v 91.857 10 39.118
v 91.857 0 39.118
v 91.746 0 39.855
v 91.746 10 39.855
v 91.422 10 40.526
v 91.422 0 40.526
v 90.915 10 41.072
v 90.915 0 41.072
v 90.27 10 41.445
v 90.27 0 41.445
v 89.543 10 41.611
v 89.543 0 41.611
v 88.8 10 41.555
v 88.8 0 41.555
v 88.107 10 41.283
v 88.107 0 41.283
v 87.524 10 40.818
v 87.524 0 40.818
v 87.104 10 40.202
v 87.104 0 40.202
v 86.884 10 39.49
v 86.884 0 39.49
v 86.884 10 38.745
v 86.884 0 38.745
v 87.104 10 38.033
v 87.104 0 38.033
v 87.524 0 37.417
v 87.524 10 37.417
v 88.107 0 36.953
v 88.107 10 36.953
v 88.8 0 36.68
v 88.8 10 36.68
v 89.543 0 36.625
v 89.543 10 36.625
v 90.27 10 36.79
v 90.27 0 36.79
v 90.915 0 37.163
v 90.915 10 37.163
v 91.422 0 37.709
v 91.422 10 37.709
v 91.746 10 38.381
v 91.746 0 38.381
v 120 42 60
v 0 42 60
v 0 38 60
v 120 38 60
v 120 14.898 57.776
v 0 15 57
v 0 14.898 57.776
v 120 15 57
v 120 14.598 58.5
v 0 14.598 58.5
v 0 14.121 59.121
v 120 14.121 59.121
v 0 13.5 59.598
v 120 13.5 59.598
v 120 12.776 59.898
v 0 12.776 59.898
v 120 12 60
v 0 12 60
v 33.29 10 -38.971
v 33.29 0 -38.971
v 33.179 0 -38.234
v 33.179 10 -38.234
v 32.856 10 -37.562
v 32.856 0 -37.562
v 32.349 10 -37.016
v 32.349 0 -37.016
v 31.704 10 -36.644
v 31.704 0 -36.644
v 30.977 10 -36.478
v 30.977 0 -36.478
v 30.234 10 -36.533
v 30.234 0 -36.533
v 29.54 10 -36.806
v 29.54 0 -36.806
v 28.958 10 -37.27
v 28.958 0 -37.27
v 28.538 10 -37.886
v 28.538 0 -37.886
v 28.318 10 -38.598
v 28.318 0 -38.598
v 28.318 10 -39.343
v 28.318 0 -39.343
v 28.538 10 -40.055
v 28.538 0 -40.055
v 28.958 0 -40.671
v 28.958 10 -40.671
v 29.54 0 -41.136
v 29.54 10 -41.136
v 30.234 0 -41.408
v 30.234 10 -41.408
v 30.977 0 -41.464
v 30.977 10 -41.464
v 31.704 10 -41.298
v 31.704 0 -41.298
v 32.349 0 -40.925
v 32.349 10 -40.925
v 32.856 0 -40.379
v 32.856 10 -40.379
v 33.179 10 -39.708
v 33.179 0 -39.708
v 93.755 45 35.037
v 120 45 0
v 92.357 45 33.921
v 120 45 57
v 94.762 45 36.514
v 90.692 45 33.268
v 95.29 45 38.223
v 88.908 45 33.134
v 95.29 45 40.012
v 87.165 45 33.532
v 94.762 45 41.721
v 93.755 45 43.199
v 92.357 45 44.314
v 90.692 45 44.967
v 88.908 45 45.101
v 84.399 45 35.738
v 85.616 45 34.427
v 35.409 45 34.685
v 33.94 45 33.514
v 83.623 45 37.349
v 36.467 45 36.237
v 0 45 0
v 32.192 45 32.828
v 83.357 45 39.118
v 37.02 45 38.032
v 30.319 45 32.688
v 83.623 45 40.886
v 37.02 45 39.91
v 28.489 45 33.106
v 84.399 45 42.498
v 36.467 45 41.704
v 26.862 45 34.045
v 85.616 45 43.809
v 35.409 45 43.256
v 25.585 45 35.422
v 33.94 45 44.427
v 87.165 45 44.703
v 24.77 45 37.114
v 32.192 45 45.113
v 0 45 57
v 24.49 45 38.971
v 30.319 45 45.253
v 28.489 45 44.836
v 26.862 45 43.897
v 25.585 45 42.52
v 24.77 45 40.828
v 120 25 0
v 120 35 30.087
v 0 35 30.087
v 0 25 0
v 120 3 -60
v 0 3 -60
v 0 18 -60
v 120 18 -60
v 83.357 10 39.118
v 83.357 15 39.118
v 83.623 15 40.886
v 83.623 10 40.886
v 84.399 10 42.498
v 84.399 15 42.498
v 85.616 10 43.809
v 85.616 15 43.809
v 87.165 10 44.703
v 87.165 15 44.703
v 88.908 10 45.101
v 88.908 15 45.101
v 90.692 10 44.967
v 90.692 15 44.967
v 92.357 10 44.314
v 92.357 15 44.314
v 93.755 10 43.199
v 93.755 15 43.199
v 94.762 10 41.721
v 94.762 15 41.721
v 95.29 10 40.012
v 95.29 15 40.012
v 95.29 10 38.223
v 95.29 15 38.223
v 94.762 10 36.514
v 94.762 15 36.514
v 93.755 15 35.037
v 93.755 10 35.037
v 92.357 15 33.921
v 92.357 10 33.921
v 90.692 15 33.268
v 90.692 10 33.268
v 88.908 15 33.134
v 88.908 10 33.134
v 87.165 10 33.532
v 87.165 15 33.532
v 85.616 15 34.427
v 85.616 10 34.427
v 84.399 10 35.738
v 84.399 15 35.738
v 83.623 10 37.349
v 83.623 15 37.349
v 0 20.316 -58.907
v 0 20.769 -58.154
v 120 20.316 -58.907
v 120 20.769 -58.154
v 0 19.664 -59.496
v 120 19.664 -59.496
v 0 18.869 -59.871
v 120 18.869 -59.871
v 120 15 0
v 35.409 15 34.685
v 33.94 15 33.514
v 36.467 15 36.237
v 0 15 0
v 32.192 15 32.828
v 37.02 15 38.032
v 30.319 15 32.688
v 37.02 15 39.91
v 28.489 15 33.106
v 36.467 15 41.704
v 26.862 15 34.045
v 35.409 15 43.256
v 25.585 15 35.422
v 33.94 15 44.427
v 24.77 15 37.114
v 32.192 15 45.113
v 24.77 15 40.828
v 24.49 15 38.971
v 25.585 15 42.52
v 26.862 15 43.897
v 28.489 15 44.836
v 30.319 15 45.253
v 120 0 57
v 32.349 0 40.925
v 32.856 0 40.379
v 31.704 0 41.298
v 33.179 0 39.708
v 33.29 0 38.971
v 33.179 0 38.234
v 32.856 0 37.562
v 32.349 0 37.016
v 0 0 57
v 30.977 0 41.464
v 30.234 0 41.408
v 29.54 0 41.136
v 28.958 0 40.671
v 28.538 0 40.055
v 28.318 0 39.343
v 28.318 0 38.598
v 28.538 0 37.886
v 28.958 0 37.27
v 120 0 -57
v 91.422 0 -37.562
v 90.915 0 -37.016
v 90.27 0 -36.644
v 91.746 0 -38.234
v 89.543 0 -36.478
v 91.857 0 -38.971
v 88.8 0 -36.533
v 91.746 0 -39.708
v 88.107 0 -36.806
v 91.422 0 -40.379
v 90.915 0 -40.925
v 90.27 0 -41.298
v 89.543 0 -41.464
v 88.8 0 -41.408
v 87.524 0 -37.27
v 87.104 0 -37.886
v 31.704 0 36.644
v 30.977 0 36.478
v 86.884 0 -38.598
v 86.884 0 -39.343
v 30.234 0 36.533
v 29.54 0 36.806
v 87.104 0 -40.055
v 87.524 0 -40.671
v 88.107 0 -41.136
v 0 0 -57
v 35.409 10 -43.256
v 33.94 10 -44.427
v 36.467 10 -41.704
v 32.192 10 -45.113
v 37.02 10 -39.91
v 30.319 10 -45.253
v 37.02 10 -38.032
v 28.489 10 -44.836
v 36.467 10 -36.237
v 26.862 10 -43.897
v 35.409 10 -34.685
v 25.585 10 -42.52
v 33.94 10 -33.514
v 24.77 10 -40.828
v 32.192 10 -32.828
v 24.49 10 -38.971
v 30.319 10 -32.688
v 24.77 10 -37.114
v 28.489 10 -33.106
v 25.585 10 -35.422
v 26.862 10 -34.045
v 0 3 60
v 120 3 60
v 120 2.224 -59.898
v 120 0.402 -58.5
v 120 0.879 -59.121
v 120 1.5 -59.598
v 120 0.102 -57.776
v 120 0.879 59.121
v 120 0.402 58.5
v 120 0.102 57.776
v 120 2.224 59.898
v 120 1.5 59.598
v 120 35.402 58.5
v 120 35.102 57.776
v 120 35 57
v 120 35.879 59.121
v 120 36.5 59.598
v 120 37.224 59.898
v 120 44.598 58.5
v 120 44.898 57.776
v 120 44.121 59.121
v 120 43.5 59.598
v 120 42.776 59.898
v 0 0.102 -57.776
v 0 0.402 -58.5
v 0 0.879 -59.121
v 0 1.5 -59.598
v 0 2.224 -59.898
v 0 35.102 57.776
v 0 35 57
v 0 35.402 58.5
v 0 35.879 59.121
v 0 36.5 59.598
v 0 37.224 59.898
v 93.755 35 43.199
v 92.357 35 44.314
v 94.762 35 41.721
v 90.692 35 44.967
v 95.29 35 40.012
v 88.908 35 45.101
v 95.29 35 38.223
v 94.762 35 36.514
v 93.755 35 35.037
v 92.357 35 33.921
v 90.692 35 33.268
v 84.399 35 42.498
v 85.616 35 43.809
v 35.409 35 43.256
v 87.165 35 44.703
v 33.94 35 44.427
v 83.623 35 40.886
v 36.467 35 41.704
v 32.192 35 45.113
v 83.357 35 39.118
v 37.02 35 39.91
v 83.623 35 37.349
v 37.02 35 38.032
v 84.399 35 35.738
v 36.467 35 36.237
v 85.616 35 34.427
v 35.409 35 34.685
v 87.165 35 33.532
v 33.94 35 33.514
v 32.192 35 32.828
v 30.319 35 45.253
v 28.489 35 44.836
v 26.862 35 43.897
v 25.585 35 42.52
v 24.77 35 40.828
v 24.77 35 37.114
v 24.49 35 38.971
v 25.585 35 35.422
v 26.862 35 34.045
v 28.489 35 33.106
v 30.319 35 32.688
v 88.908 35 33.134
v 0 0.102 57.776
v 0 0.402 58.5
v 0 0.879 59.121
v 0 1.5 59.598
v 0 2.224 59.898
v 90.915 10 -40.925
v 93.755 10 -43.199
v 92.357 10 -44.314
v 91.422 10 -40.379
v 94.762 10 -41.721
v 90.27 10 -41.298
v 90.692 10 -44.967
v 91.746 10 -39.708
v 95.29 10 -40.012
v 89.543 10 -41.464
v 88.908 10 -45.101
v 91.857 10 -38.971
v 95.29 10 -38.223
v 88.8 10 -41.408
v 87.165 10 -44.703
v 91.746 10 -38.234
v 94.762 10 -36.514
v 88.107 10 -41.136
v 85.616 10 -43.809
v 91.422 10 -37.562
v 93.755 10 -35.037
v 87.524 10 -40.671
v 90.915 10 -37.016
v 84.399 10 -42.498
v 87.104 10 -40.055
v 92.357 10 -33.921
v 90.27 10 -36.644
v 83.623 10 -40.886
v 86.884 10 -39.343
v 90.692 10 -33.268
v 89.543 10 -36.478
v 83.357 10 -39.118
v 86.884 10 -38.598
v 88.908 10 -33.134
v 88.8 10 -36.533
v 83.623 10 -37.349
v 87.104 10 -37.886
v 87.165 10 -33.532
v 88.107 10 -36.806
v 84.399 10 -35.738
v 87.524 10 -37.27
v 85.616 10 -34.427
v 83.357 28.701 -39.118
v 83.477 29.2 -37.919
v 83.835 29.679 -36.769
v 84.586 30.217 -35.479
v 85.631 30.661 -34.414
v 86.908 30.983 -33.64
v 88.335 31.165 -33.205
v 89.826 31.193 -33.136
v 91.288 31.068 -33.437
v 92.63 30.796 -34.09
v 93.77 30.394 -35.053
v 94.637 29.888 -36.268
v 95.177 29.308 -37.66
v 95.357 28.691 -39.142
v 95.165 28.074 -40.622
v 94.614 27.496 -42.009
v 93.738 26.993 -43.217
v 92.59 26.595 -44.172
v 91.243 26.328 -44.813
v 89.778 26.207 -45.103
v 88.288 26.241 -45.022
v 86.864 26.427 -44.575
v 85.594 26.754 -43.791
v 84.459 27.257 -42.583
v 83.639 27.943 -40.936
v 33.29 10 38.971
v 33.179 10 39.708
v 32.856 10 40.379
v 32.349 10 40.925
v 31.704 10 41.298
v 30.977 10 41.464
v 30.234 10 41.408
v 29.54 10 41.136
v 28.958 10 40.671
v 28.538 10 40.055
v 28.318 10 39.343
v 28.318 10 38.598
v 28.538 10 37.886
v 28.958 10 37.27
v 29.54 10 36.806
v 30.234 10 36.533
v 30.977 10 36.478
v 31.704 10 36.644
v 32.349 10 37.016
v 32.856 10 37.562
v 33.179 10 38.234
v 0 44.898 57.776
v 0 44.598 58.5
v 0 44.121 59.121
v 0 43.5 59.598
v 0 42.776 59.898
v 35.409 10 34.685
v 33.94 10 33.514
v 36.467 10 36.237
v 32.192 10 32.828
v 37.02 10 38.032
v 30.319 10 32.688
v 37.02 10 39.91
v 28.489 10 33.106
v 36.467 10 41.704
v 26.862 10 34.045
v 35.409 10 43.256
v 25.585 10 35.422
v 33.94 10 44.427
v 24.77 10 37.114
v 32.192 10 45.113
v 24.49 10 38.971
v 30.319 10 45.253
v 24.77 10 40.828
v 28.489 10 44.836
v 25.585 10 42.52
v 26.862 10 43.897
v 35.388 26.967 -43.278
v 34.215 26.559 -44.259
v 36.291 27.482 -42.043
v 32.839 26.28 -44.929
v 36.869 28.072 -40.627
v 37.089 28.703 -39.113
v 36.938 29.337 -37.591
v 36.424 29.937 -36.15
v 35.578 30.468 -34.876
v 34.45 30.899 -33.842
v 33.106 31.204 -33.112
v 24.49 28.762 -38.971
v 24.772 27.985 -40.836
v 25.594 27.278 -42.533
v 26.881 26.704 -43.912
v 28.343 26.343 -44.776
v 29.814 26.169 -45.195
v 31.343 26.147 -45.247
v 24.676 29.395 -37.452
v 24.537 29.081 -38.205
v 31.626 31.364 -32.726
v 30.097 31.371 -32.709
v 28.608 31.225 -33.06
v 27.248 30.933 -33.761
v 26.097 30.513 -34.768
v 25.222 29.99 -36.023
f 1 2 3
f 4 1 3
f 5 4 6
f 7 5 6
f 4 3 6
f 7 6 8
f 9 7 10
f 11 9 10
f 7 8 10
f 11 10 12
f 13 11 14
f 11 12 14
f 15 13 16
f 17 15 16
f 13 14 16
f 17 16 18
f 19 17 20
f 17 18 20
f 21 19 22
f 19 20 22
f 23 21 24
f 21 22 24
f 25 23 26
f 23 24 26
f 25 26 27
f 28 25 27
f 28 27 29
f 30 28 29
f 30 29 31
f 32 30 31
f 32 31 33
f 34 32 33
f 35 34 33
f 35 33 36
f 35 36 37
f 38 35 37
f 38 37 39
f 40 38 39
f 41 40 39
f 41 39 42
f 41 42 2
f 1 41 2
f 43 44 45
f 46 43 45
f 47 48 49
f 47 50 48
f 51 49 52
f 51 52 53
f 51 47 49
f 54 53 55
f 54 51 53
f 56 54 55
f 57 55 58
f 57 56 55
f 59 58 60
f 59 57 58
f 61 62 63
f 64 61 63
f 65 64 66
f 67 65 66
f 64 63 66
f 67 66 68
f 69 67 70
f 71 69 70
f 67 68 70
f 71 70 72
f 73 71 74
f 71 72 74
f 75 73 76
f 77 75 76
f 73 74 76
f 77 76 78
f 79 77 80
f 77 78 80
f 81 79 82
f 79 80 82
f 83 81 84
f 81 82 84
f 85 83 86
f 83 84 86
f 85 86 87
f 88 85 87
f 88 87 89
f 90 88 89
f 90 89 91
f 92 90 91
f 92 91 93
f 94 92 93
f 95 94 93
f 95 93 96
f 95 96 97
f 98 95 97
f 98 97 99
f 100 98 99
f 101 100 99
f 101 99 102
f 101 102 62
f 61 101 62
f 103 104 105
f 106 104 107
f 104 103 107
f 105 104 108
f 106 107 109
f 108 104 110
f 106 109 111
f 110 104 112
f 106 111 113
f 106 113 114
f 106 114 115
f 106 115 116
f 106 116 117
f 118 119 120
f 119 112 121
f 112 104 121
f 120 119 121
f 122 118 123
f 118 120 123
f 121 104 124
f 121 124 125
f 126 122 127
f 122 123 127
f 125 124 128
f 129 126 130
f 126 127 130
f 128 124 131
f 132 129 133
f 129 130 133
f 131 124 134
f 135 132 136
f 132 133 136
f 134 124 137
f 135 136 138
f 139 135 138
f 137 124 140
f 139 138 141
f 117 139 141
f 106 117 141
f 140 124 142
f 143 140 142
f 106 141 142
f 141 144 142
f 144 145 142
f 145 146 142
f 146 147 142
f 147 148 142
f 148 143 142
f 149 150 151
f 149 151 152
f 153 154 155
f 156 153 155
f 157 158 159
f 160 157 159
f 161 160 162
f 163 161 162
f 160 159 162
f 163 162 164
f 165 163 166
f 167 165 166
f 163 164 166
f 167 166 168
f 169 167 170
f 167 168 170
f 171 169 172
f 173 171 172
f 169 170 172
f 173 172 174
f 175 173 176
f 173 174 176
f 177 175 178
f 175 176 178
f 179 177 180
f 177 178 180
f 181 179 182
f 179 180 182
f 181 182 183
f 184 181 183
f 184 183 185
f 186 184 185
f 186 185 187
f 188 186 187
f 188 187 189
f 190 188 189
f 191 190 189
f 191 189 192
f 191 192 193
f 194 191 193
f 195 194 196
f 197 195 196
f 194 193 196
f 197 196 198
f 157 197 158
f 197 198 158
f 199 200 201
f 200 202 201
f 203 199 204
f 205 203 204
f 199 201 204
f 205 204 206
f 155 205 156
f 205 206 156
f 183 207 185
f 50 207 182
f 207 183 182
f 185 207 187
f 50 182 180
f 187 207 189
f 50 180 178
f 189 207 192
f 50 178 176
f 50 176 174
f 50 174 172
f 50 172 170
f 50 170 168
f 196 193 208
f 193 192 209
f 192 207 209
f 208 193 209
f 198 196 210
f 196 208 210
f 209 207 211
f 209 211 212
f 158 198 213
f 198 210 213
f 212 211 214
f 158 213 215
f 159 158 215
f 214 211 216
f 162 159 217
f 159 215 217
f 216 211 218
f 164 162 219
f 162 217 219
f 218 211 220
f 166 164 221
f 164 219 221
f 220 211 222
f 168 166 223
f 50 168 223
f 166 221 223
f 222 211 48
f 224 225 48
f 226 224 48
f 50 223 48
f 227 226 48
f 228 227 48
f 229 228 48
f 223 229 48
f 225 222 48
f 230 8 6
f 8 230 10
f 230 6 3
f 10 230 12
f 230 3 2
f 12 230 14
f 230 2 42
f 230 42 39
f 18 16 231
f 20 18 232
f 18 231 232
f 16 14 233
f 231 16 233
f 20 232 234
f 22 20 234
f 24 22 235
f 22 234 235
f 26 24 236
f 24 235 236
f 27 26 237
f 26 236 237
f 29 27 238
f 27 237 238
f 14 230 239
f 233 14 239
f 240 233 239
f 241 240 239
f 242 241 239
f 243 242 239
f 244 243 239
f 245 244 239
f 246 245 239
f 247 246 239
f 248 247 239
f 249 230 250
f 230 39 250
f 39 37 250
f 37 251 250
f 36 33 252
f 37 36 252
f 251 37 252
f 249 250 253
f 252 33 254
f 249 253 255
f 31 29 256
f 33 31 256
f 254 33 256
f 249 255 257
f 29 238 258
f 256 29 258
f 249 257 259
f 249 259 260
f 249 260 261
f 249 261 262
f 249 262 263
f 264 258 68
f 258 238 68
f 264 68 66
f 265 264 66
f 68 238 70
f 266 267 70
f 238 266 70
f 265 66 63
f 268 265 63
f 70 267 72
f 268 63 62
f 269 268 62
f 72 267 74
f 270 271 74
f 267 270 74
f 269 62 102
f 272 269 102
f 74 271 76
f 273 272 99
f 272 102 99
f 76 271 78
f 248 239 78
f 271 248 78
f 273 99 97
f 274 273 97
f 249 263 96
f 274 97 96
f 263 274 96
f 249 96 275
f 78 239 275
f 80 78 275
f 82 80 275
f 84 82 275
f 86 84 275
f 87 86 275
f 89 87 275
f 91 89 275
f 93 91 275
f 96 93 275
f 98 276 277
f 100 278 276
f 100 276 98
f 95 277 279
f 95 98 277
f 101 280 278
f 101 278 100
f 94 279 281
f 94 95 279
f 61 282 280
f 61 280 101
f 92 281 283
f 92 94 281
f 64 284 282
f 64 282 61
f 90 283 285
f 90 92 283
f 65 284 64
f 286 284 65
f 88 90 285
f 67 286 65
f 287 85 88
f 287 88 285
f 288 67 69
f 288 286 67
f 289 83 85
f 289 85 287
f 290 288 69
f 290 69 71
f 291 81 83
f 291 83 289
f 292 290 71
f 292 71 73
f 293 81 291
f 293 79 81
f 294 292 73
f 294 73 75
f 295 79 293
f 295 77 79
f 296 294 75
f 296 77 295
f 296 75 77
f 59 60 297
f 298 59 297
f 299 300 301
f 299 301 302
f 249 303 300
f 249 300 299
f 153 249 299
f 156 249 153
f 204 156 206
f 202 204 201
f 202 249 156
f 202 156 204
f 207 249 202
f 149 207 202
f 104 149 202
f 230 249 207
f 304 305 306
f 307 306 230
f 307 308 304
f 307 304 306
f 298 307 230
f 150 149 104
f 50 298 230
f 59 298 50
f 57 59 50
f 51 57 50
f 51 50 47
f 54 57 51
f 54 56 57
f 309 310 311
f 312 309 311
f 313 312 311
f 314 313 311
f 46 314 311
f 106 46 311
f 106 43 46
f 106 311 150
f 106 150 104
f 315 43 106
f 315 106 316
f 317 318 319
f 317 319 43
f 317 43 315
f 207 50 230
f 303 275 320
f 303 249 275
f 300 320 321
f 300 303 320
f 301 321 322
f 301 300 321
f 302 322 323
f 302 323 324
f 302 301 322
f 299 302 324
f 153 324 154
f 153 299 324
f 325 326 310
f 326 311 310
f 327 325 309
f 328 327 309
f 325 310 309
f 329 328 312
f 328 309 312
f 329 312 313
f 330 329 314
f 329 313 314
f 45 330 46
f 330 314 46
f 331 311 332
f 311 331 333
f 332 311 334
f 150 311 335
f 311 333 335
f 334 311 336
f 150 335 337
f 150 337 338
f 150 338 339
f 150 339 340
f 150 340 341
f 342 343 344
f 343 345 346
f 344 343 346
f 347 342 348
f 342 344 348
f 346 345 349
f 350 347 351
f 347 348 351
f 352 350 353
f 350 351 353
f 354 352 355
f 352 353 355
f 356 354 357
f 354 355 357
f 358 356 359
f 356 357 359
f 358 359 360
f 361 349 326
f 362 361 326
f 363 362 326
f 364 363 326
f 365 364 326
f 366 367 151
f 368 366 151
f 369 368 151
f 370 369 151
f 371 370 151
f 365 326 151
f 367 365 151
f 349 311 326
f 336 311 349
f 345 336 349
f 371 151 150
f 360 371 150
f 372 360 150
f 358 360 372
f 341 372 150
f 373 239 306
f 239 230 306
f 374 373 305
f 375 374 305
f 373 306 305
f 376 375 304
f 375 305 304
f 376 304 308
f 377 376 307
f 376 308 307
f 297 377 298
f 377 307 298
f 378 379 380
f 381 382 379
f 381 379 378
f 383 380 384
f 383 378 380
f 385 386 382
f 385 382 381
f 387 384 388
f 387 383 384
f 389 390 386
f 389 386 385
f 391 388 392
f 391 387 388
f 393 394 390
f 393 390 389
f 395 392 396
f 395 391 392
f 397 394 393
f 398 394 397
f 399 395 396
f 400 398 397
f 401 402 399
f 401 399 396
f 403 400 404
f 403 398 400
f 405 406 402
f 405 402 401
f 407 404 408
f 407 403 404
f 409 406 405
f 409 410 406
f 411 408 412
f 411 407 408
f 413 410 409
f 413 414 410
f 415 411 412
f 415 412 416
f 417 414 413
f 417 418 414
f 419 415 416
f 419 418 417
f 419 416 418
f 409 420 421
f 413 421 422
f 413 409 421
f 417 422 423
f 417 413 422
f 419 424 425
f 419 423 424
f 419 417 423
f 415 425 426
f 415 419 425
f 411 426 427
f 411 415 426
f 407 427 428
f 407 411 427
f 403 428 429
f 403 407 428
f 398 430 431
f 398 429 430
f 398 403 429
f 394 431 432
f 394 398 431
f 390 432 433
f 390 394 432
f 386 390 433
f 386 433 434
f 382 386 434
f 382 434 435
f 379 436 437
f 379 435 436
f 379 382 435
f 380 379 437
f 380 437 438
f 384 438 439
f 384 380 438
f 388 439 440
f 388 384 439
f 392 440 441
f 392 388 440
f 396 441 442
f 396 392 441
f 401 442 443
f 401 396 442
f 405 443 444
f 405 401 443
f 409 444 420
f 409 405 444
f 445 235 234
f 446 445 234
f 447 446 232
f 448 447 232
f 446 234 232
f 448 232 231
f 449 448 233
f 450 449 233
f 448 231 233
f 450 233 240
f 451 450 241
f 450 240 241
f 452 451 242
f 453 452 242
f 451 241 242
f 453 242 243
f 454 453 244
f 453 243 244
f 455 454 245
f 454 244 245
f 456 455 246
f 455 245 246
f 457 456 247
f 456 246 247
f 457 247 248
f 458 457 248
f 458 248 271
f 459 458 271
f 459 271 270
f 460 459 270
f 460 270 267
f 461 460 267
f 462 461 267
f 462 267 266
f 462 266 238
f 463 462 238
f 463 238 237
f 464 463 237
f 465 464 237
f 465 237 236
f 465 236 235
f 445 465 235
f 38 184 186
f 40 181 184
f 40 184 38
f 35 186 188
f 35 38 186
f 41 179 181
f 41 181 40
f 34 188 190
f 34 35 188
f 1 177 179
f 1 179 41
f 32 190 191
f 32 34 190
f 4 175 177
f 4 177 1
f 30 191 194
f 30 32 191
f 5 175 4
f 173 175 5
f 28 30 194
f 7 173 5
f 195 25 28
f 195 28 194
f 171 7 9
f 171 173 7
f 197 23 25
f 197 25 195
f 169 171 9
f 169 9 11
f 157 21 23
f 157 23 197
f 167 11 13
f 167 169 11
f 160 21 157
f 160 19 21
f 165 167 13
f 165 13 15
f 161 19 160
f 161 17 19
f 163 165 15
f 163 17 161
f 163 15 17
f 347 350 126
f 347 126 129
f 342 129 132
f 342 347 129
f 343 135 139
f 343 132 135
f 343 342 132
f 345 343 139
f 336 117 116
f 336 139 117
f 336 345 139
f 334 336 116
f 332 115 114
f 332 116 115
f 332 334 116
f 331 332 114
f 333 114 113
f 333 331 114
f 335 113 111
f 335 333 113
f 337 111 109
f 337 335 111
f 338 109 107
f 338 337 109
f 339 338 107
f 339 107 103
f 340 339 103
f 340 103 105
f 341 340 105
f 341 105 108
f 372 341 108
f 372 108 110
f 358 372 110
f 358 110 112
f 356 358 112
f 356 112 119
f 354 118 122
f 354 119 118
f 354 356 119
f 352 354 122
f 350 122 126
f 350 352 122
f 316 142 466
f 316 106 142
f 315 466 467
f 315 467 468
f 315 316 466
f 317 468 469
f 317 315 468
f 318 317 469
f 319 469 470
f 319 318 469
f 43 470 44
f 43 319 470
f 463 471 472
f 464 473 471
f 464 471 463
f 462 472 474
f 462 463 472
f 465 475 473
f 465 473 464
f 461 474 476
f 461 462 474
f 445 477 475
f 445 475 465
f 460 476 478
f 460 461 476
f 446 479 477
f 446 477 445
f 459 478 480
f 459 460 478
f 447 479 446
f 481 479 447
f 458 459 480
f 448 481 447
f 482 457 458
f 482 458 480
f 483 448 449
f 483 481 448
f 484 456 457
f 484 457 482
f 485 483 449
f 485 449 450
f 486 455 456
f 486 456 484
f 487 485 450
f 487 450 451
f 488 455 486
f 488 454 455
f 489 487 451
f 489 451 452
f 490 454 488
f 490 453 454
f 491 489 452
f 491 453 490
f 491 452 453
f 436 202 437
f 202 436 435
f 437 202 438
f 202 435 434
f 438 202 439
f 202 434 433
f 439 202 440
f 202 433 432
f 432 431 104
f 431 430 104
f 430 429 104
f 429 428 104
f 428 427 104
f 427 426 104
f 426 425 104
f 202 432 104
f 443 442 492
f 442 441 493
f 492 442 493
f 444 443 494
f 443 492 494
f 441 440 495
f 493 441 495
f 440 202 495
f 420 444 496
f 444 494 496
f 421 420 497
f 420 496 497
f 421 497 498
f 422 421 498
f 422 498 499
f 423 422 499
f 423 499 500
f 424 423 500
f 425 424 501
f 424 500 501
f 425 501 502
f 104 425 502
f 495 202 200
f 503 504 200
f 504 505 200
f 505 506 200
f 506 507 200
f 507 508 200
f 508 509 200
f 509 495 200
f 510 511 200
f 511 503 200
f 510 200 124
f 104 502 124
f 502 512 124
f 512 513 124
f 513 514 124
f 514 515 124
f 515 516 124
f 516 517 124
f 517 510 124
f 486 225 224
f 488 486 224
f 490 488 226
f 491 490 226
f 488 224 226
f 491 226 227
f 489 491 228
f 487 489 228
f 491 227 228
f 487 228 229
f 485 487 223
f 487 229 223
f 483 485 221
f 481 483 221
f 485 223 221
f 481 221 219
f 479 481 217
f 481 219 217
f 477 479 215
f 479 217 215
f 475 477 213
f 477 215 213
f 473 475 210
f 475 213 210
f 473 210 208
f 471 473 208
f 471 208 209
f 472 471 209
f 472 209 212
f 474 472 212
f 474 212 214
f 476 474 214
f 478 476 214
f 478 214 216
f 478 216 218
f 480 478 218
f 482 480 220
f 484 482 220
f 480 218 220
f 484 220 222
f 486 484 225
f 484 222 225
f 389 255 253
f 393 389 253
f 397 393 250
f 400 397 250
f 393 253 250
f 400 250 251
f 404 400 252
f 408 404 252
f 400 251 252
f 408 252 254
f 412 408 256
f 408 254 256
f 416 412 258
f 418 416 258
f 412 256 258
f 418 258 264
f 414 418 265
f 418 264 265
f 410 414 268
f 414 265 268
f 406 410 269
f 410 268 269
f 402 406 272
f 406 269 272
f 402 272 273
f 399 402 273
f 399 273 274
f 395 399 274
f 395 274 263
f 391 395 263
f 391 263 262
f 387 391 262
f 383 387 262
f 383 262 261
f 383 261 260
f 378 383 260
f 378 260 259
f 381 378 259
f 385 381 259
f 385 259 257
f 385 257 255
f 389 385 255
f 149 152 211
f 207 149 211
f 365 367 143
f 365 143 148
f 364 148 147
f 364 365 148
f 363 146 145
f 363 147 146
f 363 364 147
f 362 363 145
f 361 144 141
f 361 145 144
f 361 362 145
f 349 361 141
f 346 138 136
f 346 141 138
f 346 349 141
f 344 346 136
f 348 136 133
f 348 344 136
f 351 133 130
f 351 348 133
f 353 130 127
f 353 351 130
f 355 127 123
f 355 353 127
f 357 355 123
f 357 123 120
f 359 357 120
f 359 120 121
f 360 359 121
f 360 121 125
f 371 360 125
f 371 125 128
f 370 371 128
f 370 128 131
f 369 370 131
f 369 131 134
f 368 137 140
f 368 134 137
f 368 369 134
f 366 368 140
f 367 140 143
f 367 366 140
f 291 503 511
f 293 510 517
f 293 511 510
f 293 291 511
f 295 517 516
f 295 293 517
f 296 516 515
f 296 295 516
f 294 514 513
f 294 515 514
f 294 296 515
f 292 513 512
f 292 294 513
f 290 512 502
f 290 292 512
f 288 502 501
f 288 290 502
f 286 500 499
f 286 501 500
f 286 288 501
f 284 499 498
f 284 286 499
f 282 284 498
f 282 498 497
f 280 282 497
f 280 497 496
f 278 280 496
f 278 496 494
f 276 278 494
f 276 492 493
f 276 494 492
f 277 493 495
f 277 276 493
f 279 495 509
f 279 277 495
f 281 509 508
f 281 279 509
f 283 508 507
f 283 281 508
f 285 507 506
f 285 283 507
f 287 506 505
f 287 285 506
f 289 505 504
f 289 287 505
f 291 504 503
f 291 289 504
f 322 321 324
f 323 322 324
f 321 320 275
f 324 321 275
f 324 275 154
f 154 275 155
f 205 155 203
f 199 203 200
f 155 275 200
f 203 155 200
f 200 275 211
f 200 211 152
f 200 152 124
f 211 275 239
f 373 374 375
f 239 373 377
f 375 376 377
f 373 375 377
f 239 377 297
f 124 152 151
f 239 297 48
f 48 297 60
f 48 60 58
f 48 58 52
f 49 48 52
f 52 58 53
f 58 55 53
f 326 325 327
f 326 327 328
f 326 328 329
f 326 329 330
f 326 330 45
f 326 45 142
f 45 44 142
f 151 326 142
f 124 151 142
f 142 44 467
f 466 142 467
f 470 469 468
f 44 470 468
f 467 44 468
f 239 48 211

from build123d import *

# Parameters (mm, degrees)
F1_DEPTH = 120
F2_R     = 2.5
F3_DEPTH = 45.001
F4_R     = 6
F4_R_2   = 6.300335
F5_DEPTH = 50.546
F6_DEPTH = 5
F7_R     = 3


with BuildPart() as f1:
    # F0 (on Right) → F1 (new body)
    with BuildSketch(Plane.YZ):
        Polygon((0, 60), (0, 0), (0, -60), (20, -60), (45, 0), (45, 60), (35, 60), (35, 30.086774), (25, 0), (15, 0), (15, 60), align=None)
    extrude(amount=F1_DEPTH)

    # F2 (on face) → F3 (cut, through all)
    with BuildSketch(Plane.XZ):
        with Locations((89.356575, 39.11762)):
            Circle(F2_R)
        with Locations((30.790308, 38.970736)):
            Circle(F2_R)
        with Locations((30.790308, -38.970736)):
            Circle(F2_R)
        with Locations((89.356575, -38.970736)):
            Circle(F2_R)
    extrude(amount=-F3_DEPTH, mode=Mode.SUBTRACT)

    # F4 (on face) → F5 (cut)
    with BuildSketch(Plane(origin=(0, 15, 0), x_dir=(-1, 0, 0), z_dir=(0, 1, 0))):
        with Locations((-89.356575, 39.11762)):
            Circle(F4_R)
        with Locations((-30.790308, 38.970736)):
            Circle(F4_R_2)
        with Locations((-89.356575, -39.11762)):
            Circle(F4_R)
        with Locations((-30.790308, -38.970736)):
            Circle(F4_R_2)
    extrude(amount=F5_DEPTH, mode=Mode.SUBTRACT)

    # F4 (on face) → F6 (cut)
    with BuildSketch(Plane(origin=(0, 15, 0), x_dir=(-1, 0, 0), z_dir=(0, 1, 0))):
        with Locations((-89.356575, 39.11762)):
            Circle(F4_R)
        with Locations((-30.790308, 38.970736)):
            Circle(F4_R_2)
        with Locations((-89.356575, -39.11762)):
            Circle(F4_R)
        with Locations((-30.790308, -38.970736)):
            Circle(F4_R_2)
    extrude(amount=-F6_DEPTH, mode=Mode.SUBTRACT)

    # F7
    f7_edges = [f1.edges().sort_by_distance(p)[0] for p in [
        (60, 0, 60),
        (60, 15, 60),
        (60, 35, 60),
        (60, 45, 60),
        (60, 0, -60),
        (60, 20, -60),
    ]]
    fillet(f7_edges, radius=F7_R)


solid = f1.part
